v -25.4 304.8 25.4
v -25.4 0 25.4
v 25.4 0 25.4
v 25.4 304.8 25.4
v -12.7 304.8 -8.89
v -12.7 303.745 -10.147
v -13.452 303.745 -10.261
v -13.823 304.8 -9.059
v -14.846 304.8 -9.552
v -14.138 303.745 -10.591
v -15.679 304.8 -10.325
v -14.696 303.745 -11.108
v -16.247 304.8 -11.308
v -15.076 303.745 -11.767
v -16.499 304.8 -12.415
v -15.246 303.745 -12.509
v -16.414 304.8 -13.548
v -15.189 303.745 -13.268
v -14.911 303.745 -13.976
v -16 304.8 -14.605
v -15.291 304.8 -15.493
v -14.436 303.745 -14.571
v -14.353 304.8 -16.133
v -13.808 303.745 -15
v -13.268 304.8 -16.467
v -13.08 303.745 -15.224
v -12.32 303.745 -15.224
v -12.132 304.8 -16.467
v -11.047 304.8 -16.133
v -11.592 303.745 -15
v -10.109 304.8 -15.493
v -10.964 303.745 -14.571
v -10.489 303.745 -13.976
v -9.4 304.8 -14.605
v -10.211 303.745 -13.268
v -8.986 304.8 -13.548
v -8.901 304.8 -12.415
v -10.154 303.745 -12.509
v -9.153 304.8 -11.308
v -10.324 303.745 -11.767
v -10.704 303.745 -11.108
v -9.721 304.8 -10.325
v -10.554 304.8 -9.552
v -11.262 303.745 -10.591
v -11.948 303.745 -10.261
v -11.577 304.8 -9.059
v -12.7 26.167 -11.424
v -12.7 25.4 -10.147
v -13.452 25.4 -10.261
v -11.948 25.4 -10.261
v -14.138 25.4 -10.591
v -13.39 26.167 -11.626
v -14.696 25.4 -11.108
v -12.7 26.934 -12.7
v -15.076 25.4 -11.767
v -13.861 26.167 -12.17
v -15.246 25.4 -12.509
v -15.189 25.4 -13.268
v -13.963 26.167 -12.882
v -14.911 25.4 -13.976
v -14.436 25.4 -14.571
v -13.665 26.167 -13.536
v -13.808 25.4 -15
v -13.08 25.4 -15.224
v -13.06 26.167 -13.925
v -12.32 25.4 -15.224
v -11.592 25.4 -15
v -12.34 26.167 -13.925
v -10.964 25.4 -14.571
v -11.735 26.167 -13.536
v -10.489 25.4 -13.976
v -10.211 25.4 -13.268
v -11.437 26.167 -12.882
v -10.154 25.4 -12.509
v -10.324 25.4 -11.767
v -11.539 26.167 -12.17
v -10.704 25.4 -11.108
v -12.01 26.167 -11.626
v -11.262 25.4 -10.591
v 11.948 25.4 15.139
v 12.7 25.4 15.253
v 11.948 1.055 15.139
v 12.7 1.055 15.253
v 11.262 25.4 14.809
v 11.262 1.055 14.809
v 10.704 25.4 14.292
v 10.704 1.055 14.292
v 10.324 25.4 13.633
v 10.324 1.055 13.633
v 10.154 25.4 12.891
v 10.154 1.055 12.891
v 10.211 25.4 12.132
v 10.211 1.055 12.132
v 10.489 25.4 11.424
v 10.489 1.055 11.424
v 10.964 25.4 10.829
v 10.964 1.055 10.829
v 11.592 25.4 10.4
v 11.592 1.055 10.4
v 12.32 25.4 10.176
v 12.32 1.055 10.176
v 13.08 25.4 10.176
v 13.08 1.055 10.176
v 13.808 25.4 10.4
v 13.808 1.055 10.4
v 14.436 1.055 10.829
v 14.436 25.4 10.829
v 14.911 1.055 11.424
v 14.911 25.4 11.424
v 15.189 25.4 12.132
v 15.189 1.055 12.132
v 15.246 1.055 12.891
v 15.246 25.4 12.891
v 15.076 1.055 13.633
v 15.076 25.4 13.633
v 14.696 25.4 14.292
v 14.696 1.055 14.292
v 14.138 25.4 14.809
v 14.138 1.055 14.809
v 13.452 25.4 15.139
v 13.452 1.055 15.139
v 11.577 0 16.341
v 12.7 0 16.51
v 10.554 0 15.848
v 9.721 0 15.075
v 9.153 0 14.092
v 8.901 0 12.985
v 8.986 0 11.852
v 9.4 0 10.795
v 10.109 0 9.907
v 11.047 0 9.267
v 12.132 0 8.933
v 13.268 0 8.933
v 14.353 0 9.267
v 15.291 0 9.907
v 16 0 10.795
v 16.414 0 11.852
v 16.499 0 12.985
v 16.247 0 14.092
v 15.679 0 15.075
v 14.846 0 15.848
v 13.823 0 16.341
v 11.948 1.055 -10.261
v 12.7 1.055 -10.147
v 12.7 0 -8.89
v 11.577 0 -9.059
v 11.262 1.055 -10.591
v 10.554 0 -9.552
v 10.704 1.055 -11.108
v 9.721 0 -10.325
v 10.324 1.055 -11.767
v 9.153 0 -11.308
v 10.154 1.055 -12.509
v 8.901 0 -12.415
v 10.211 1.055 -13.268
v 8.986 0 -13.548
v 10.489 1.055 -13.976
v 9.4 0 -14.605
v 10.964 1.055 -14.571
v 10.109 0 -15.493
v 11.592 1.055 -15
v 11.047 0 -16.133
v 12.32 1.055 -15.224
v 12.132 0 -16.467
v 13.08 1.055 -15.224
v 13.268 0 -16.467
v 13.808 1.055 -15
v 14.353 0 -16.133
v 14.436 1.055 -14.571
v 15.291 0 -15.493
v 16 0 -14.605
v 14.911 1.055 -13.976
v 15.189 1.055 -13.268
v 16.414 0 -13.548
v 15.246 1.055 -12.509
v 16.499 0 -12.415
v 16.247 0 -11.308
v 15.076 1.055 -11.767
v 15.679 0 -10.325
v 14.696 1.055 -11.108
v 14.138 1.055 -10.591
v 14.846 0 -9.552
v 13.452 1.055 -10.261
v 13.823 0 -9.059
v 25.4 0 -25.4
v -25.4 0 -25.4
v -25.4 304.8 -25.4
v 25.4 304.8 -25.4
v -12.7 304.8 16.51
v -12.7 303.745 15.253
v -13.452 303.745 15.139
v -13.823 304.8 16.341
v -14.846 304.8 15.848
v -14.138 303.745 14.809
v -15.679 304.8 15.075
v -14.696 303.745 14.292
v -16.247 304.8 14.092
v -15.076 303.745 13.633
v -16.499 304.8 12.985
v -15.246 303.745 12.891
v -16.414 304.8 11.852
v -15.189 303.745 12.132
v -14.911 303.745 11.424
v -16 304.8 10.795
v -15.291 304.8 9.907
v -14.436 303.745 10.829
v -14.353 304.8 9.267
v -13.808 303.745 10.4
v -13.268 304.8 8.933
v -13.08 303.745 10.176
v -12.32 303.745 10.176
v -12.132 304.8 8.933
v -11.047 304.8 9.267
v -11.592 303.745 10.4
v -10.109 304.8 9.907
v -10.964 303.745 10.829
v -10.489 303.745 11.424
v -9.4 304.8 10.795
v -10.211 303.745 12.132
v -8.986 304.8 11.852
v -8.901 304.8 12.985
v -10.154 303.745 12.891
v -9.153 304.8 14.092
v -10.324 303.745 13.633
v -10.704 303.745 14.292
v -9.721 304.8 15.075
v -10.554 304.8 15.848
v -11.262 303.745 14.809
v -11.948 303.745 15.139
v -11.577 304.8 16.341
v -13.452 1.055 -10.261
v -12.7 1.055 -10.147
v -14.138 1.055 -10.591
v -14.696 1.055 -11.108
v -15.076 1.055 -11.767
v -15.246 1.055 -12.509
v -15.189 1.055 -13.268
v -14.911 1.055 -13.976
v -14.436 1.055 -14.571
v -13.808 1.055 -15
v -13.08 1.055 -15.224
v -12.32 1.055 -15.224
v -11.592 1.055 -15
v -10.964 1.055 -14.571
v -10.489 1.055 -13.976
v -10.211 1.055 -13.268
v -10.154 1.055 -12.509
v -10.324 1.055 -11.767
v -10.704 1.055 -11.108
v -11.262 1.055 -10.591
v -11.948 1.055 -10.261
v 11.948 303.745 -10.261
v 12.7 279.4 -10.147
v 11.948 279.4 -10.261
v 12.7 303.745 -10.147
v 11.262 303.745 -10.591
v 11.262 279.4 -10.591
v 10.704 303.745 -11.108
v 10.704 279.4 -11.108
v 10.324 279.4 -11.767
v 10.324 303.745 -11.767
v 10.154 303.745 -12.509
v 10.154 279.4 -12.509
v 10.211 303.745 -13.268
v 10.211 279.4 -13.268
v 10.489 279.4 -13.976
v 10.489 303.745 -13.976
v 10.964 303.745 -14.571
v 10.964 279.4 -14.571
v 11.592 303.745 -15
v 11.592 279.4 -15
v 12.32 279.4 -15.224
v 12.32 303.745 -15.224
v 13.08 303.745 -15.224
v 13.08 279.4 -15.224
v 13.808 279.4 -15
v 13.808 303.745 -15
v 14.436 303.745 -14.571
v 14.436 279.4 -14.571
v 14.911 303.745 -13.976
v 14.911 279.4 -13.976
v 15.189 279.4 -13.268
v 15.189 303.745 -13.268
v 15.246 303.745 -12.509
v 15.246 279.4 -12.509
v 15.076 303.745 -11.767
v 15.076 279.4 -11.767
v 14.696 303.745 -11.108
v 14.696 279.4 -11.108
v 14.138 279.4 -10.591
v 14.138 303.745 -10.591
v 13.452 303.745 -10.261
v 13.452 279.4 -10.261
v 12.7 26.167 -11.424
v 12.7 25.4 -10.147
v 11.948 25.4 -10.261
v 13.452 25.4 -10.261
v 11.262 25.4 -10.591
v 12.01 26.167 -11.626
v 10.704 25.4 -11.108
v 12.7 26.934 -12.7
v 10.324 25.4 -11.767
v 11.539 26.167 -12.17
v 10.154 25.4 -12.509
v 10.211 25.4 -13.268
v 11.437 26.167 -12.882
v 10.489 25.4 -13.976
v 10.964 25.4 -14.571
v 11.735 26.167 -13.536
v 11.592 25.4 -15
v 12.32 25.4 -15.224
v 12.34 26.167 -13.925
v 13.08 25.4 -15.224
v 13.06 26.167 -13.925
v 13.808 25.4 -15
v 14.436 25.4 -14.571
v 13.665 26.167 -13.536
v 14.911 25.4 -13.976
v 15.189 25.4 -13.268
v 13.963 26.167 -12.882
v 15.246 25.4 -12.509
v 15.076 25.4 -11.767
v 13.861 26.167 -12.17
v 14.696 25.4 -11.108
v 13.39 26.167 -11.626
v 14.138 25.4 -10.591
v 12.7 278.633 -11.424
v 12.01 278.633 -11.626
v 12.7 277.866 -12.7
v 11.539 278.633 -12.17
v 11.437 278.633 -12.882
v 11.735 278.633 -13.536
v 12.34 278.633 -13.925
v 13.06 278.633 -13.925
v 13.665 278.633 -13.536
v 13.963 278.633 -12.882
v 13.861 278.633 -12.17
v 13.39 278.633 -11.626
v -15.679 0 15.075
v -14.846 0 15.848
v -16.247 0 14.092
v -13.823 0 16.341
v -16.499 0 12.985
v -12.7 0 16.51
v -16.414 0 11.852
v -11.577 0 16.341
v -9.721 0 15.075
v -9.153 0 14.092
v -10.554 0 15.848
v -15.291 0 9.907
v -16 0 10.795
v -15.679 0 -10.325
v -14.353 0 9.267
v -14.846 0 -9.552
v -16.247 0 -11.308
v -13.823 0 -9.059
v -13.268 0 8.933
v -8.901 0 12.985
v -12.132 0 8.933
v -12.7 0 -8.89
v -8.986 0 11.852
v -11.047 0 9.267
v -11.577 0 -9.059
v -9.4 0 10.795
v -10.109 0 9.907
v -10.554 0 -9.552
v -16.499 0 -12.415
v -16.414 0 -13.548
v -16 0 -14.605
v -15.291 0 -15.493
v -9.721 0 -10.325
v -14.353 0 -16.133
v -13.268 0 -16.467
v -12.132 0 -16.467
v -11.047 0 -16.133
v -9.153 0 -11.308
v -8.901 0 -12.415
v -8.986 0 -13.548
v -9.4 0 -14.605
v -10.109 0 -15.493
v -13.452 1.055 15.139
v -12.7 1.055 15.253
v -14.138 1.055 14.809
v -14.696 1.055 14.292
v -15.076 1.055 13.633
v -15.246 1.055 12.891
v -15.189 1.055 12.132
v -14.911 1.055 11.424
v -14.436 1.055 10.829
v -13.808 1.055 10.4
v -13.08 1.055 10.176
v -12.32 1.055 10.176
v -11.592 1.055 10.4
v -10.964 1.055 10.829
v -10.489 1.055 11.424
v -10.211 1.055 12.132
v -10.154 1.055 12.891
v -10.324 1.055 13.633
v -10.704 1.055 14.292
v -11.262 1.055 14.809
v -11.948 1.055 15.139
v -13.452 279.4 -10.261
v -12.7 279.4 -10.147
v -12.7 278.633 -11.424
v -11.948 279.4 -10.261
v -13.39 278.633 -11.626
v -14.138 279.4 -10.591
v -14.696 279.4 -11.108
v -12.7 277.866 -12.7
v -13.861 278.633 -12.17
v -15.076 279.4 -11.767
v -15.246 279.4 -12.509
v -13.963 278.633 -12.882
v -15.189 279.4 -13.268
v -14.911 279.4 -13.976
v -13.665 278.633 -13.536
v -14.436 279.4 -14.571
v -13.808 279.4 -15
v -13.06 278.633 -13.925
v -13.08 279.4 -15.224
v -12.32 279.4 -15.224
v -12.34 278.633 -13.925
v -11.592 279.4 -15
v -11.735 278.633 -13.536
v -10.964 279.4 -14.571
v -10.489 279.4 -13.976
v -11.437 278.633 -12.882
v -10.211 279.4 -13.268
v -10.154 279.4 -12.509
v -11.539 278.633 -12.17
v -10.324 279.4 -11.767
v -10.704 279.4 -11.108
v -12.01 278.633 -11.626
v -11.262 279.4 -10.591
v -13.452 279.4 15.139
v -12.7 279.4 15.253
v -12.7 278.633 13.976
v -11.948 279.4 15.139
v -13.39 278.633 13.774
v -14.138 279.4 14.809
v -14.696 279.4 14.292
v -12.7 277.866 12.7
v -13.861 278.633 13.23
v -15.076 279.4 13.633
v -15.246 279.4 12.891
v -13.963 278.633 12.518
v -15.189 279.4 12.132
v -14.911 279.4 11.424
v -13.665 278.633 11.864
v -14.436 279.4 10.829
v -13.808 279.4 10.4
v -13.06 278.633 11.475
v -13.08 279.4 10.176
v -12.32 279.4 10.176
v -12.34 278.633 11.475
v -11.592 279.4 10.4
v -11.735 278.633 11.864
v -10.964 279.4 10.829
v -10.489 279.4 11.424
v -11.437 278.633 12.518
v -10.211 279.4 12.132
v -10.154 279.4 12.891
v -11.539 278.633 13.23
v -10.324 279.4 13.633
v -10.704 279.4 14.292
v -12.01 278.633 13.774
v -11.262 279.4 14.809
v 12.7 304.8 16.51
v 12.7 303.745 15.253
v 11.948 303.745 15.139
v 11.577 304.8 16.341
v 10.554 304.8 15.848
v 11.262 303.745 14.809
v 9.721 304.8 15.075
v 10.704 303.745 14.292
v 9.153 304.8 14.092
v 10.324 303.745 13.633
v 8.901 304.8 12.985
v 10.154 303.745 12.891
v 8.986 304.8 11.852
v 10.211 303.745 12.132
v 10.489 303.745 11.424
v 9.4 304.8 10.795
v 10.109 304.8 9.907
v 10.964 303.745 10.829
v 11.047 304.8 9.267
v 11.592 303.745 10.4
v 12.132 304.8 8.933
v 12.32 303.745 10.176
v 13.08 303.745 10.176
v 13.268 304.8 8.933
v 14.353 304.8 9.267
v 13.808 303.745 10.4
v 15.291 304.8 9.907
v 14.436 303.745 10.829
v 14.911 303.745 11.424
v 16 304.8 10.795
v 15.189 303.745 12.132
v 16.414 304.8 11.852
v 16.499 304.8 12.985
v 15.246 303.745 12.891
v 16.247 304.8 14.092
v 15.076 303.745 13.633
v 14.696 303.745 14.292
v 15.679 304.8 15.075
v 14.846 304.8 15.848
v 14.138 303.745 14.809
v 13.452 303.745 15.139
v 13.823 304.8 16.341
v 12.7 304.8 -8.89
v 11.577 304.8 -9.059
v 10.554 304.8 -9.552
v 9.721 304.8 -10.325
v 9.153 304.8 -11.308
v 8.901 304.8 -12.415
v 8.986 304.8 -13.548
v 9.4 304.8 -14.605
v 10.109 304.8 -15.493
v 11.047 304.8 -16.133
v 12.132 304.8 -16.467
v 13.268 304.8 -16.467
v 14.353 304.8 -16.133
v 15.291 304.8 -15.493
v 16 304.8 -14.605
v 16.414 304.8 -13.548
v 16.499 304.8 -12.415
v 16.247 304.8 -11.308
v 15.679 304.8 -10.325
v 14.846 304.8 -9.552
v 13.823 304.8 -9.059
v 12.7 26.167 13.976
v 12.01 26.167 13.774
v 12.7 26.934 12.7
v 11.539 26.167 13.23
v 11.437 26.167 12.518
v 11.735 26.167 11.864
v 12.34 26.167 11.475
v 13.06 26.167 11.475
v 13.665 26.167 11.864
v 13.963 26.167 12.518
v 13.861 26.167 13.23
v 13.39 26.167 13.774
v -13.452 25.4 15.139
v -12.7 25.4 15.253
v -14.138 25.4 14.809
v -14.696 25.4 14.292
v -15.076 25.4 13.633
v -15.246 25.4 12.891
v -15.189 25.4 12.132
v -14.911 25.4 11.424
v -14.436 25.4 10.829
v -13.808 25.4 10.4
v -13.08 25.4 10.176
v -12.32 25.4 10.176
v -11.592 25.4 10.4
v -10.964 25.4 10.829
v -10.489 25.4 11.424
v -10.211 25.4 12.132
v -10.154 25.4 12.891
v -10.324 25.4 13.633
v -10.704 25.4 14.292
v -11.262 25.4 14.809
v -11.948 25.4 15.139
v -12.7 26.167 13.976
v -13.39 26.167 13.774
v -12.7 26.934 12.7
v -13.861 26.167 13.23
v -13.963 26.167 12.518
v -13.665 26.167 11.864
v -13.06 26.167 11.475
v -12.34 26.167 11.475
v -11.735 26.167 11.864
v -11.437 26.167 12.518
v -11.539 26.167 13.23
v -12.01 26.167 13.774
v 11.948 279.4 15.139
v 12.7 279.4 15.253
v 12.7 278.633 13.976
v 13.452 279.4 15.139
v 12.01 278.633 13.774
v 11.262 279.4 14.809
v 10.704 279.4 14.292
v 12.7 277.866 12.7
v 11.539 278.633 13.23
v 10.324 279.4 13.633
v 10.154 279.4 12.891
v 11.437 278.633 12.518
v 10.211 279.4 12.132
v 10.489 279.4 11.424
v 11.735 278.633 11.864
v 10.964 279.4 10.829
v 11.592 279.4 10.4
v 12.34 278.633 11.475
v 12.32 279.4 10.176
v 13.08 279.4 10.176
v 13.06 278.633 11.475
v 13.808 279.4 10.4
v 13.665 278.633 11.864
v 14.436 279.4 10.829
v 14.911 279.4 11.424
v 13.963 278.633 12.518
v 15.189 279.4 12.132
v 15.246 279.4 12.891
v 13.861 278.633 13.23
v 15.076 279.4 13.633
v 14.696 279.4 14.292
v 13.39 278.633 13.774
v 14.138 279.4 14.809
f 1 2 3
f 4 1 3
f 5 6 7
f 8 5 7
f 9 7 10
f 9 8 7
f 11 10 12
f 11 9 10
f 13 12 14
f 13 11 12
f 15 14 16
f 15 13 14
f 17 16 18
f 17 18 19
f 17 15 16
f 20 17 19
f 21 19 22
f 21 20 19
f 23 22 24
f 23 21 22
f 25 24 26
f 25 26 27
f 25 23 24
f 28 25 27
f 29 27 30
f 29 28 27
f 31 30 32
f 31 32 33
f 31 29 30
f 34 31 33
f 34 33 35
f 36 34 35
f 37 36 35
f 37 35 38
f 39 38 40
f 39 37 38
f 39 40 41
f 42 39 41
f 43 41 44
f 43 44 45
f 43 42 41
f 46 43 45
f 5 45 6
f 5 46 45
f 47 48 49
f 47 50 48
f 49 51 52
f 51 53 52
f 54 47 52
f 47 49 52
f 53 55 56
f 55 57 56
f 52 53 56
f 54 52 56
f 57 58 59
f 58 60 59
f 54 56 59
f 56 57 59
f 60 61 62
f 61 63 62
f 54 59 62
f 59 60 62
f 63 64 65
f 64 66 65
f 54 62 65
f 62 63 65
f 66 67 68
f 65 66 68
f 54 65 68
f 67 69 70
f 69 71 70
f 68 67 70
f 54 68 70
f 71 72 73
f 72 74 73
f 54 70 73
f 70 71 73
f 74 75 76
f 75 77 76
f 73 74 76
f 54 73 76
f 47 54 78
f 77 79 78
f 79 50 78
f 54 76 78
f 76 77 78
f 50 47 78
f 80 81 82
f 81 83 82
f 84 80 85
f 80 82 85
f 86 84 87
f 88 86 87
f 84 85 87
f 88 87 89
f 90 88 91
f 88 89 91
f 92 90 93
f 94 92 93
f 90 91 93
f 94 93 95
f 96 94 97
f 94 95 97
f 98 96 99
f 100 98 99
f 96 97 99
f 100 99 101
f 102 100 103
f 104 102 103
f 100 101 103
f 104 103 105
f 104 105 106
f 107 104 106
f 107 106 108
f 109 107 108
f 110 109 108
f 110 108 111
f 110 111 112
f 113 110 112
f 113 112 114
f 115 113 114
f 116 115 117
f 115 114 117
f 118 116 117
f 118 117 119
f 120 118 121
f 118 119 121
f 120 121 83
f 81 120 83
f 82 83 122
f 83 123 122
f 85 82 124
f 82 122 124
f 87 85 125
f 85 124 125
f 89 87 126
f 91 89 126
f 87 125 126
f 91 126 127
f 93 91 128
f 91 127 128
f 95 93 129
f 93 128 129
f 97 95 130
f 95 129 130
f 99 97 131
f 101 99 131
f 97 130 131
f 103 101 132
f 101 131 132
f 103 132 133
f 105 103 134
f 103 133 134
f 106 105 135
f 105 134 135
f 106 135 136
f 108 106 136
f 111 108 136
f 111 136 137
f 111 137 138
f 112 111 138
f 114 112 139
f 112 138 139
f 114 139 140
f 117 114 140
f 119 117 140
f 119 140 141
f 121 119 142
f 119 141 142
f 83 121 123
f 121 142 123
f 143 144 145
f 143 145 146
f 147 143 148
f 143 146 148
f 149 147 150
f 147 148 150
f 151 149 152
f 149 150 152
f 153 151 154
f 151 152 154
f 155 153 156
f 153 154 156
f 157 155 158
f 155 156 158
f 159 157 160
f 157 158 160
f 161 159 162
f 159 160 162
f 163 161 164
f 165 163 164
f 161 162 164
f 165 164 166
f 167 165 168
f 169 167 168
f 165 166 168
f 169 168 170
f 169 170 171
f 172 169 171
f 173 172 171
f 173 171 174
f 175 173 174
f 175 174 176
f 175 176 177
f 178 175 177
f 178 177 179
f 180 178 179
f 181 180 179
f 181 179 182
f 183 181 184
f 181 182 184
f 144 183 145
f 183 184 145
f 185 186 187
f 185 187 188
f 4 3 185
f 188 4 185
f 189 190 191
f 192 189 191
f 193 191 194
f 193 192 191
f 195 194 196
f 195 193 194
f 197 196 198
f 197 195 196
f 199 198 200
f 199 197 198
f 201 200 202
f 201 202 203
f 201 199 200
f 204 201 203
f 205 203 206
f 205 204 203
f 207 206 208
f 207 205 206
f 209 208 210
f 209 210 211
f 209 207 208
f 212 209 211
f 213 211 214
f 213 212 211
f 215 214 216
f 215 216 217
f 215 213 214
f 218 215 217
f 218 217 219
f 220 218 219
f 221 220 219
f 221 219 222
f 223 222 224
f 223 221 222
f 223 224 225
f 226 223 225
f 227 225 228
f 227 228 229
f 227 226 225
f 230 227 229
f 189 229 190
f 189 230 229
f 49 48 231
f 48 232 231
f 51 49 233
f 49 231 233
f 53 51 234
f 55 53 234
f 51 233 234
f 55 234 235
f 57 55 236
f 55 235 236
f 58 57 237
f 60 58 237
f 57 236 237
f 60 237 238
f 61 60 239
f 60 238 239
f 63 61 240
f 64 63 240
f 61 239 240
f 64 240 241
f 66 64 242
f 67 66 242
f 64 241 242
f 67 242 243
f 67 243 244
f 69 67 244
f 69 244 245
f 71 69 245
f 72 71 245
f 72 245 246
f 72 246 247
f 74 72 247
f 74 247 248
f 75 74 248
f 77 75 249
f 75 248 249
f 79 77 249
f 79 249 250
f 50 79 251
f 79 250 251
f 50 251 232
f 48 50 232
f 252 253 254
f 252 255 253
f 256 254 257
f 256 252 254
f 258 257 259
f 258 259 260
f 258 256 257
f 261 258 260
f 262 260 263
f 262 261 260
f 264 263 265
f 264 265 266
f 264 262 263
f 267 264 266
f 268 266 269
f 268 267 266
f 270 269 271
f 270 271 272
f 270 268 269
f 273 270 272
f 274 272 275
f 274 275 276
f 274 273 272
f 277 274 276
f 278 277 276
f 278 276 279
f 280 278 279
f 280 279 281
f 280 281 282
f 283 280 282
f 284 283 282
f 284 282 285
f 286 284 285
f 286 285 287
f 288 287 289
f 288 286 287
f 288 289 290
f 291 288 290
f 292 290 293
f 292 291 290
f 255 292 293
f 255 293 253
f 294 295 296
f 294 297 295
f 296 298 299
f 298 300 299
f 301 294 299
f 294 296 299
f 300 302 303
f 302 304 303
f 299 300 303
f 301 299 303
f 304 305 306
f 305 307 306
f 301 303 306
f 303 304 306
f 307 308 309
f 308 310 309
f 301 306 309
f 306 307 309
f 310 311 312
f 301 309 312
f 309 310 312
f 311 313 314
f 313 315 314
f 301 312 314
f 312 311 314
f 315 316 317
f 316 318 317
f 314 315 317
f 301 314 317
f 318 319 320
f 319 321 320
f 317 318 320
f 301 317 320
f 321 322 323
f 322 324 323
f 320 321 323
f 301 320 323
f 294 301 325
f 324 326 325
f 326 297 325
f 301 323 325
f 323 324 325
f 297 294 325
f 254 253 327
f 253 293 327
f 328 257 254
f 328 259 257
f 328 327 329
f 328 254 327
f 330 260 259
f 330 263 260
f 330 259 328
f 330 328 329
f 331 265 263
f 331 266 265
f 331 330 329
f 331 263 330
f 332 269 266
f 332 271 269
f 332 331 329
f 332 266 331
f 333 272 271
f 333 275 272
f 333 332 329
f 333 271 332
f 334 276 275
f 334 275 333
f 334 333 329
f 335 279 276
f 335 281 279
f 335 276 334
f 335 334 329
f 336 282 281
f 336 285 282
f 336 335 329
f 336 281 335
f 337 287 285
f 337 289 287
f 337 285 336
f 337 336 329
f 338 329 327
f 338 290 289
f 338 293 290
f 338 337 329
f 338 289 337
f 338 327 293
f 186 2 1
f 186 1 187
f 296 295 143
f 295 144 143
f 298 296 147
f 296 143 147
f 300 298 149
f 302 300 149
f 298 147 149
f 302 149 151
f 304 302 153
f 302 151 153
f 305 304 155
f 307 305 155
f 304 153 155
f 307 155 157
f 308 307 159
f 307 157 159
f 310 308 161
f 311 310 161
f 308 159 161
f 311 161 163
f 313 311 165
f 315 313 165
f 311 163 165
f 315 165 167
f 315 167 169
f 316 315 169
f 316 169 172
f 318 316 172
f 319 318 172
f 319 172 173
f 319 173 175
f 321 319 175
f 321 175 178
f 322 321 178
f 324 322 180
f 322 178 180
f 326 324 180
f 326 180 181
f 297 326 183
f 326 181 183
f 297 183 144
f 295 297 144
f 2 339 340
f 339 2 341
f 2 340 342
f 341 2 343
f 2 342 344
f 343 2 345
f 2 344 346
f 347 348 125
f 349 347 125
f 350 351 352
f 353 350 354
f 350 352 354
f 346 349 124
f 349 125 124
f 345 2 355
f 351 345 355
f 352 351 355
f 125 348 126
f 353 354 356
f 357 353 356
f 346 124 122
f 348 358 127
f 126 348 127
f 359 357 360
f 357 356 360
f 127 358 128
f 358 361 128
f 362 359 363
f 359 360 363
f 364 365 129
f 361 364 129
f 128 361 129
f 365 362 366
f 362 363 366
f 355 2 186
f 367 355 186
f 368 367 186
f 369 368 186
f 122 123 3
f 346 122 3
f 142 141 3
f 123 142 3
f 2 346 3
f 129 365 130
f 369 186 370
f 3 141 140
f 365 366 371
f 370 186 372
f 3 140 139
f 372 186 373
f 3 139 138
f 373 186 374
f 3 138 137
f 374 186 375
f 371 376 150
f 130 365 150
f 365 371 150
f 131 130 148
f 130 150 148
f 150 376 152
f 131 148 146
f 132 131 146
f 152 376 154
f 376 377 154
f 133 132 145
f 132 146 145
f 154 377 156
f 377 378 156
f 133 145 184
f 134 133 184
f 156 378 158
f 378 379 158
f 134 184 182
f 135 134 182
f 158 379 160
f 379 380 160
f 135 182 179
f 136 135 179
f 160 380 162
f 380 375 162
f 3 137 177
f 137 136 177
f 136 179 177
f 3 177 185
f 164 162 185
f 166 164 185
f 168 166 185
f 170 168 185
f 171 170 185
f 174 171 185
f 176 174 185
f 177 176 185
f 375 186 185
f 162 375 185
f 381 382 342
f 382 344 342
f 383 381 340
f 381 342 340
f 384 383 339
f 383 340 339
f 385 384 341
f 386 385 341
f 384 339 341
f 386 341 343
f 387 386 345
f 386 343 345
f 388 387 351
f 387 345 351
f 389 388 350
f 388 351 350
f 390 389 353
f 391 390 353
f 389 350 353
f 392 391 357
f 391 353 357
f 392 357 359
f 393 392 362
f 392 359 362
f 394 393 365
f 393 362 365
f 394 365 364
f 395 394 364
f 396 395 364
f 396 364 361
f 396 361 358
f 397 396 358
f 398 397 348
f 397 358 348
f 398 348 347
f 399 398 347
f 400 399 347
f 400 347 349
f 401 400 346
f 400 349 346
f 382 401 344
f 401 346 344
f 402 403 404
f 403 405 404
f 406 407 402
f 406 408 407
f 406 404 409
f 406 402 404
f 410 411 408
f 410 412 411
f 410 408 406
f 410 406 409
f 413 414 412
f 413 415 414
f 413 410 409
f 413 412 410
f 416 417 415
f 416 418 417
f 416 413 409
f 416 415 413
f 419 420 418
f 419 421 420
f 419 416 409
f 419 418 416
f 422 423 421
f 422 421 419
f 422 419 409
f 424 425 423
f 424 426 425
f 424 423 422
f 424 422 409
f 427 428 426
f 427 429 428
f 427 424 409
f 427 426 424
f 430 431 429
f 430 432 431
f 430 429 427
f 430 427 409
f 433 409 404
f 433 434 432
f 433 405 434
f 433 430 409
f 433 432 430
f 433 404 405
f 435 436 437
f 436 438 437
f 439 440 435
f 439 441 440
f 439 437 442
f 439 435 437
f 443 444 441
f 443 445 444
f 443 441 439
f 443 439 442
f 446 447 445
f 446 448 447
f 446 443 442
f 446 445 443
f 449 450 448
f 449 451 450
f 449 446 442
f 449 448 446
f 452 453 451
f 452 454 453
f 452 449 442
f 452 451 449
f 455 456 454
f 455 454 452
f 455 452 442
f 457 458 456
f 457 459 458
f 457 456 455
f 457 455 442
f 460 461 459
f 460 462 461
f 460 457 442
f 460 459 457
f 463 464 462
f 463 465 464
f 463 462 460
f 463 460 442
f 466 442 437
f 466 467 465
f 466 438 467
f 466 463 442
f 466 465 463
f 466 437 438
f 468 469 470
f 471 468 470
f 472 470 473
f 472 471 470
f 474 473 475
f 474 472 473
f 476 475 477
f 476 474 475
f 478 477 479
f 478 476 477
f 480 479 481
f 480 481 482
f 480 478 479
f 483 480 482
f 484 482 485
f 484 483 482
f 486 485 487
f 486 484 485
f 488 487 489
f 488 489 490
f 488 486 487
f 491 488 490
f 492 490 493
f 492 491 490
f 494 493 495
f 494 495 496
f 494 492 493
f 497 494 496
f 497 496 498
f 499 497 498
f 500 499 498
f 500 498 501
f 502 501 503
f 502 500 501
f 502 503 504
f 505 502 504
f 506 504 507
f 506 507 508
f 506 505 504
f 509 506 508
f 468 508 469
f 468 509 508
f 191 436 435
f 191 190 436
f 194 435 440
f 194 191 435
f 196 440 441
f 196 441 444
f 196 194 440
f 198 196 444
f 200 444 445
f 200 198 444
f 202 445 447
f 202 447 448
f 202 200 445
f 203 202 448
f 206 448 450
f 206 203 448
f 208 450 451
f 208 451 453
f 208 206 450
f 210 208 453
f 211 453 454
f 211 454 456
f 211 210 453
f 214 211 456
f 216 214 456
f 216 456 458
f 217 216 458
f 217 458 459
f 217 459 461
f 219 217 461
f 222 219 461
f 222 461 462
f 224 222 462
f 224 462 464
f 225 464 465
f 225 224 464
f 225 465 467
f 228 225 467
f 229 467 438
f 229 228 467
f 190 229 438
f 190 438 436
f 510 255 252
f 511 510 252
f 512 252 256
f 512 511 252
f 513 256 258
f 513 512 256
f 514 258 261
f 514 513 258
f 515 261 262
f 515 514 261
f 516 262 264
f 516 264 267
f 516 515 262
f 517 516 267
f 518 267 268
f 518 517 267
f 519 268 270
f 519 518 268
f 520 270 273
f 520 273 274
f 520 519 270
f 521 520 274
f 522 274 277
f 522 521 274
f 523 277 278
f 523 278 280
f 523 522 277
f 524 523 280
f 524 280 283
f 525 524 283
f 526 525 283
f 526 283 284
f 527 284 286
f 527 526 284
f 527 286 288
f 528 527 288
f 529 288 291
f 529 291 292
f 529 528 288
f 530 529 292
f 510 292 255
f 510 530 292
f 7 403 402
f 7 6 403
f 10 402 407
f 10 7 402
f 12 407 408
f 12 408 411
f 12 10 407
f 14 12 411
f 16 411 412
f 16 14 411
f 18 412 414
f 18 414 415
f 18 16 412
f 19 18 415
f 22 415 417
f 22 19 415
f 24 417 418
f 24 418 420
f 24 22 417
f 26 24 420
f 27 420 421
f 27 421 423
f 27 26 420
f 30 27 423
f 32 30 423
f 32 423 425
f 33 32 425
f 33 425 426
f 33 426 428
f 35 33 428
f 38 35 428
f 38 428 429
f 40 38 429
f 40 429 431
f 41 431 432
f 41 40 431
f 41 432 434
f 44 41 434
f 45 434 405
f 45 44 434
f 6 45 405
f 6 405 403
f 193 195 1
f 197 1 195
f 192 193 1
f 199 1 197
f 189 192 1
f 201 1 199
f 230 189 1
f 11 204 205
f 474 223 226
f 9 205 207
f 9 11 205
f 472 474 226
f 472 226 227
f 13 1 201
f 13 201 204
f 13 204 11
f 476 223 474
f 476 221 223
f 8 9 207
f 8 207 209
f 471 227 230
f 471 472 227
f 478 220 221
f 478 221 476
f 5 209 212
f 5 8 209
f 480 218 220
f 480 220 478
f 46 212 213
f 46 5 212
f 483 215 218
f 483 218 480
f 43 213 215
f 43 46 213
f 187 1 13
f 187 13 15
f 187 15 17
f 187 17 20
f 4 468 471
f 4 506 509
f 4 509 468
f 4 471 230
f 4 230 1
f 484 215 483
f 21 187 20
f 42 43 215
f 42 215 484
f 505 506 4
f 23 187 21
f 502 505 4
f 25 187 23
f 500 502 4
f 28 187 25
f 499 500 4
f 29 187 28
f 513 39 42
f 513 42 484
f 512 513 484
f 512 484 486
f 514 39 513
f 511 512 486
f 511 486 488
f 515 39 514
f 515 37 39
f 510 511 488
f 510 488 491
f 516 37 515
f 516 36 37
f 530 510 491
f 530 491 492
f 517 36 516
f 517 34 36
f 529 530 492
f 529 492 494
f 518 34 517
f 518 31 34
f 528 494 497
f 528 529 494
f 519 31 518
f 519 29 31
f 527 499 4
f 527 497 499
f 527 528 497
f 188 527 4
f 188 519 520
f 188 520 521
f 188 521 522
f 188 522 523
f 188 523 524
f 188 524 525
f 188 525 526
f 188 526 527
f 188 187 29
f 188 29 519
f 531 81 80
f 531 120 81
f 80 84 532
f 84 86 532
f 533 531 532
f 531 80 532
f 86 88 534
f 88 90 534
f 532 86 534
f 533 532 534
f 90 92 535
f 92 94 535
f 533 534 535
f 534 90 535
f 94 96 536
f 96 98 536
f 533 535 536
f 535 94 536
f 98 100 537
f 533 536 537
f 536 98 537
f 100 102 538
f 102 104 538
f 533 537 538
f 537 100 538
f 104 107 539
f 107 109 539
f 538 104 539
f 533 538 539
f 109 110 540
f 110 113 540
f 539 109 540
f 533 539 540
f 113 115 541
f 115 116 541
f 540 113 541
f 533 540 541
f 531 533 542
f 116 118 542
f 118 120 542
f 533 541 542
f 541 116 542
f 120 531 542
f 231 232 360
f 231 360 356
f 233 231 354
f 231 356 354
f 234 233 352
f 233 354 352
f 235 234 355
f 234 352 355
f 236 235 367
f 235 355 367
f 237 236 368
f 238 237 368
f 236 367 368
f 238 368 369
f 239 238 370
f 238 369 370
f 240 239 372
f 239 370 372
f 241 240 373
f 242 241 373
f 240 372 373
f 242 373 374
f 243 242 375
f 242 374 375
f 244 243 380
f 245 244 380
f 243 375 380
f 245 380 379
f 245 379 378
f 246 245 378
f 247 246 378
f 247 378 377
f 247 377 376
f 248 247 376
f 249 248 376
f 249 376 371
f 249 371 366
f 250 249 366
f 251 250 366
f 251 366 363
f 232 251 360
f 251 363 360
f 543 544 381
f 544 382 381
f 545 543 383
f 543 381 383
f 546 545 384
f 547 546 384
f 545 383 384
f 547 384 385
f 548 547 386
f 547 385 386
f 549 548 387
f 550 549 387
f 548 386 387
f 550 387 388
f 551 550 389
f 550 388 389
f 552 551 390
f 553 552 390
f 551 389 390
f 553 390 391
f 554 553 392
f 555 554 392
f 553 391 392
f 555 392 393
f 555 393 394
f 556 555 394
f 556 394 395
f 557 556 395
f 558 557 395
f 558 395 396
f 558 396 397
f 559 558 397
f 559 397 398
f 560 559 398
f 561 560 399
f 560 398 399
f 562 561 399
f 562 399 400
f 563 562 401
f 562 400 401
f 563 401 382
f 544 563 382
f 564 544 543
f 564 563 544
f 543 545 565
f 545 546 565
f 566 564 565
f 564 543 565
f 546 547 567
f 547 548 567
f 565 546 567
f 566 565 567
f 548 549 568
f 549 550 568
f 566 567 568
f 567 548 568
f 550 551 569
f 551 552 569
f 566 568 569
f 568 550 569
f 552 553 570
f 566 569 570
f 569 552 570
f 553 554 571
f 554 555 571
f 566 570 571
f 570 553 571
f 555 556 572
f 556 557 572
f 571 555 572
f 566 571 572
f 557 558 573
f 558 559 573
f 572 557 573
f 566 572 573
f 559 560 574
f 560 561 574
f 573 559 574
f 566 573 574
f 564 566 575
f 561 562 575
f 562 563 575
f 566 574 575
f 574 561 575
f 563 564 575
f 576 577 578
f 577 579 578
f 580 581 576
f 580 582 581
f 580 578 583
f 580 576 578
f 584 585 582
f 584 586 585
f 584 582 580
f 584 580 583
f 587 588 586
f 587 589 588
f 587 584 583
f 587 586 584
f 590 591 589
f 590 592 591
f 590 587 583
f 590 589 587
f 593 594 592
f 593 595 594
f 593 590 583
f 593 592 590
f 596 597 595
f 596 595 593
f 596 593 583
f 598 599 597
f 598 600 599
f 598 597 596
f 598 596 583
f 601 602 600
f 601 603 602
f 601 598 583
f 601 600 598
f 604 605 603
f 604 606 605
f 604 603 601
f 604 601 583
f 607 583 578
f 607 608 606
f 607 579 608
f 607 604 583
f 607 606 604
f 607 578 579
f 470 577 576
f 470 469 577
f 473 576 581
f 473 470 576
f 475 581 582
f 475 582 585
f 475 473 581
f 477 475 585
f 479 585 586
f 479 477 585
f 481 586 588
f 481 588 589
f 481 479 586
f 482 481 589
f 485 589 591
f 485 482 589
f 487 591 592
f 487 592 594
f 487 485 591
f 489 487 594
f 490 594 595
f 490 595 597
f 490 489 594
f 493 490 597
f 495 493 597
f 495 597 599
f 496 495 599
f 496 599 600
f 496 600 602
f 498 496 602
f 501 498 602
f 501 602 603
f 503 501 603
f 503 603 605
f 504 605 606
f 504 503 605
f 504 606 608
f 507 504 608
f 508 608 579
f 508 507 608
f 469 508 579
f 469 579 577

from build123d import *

# Parameters (mm, degrees)
SKETCH1_W                        = 50.8
SKETCH1_H                        = 50.8
BOSS_EXTRUDE1_DEPTH              = 304.8
F_1_4_20_TAPPED_HOLE1_AT_2_COUNT = 2
F_1_4_20_TAPPED_HOLE1_AT_2_PITCH = 25.4
F_1_4_20_TAPPED_HOLE1_AT_3_COUNT = 2
F_1_4_20_TAPPED_HOLE1_AT_3_PITCH = 35.921024484
F_1_4_20_TAPPED_HOLE1_AT_4_COUNT = 2
F_1_4_20_TAPPED_HOLE1_AT_4_PITCH = 25.4


with BuildPart() as part:
    # Sketch1 → Boss-Extrude1 (new body)
    with BuildSketch(Plane(origin=(0, 0, 0), x_dir=(1, 0, 0), z_dir=(0, 1, 0))):
        Rectangle(SKETCH1_W, SKETCH1_H)
    extrude(amount=BOSS_EXTRUDE1_DEPTH)

    # Sketch3 → 1/4-20 Tapped Hole1 (revolve, cut)
    with BuildSketch(Plane(origin=(-12.7, 304.8, -12.7), x_dir=(0, 0, 1), z_dir=(1, 0, 0))):
        Polygon((0, 0), (0, 26.933816902), (2.5527, 25.4), (2.5527, 1.054999966), (3.81, 0), align=None)
    f_1_4_20_tapped_hole1 = revolve(axis=Axis((-12.7, 311.15, -12.7), (0, -1, 0)), mode=Mode.SUBTRACT)

    # 1/4-20 Tapped Hole1 at 2: 1/4-20 Tapped Hole1 ×2
    with Locations(*[(i * F_1_4_20_TAPPED_HOLE1_AT_2_PITCH, 0, 0) for i in range(1, F_1_4_20_TAPPED_HOLE1_AT_2_COUNT)]):
        add(f_1_4_20_tapped_hole1, mode=Mode.SUBTRACT)

    # 1/4-20 Tapped Hole1 at 3: 1/4-20 Tapped Hole1 ×2
    with Locations(*[Vector(0.7071067811865476, 0, 0.7071067811865475) * (i * F_1_4_20_TAPPED_HOLE1_AT_3_PITCH) for i in range(1, F_1_4_20_TAPPED_HOLE1_AT_3_COUNT)]):
        add(f_1_4_20_tapped_hole1, mode=Mode.SUBTRACT)

    # 1/4-20 Tapped Hole1 at 4: 1/4-20 Tapped Hole1 ×2
    with Locations(*[(0, 0, i * F_1_4_20_TAPPED_HOLE1_AT_4_PITCH) for i in range(1, F_1_4_20_TAPPED_HOLE1_AT_4_COUNT)]):
        add(f_1_4_20_tapped_hole1, mode=Mode.SUBTRACT)

    # Mirror1: 1/4-20 Tapped Hole1 across plane
    add(f_1_4_20_tapped_hole1.mirror(Plane(origin=(0, 152.4, 0), x_dir=(0, 0, 1), z_dir=(0, -1, 0))), mode=Mode.SUBTRACT)

    # Mirror1 copy 1 sketch → Mirror1 copy 1 (revolve, cut)
    with BuildSketch(Plane(origin=(12.7, 0, -12.7), x_dir=(0, 0, 1), z_dir=(1, 0, 0))):
        Polygon((0, 0), (0, -26.933816902), (2.5527, -25.4), (2.5527, -1.054999966), (3.81, 0), align=None)
    revolve(axis=Axis((12.7, -6.35, -12.7), (0, -1, 0)), mode=Mode.SUBTRACT)

    # Mirror1 copy 2 sketch → Mirror1 copy 2 (revolve, cut)
    with BuildSketch(Plane(origin=(12.7, 0, 12.7), x_dir=(0, 0, 1), z_dir=(1, 0, 0))):
        Polygon((0, 0), (0, -26.933816902), (2.5527, -25.4), (2.5527, -1.054999966), (3.81, 0), align=None)
    revolve(axis=Axis((12.7, -6.35, 12.7), (0, -1, 0)), mode=Mode.SUBTRACT)

    # Mirror1 copy 3 sketch → Mirror1 copy 3 (revolve, cut)
    with BuildSketch(Plane(origin=(-12.7, 0, 12.7), x_dir=(0, 0, 1), z_dir=(1, 0, 0))):
        Polygon((0, 0), (0, -26.933816902), (2.5527, -25.4), (2.5527, -1.054999966), (3.81, 0), align=None)
    revolve(axis=Axis((-12.7, -6.35, 12.7), (0, -1, 0)), mode=Mode.SUBTRACT)


solid = part.part
